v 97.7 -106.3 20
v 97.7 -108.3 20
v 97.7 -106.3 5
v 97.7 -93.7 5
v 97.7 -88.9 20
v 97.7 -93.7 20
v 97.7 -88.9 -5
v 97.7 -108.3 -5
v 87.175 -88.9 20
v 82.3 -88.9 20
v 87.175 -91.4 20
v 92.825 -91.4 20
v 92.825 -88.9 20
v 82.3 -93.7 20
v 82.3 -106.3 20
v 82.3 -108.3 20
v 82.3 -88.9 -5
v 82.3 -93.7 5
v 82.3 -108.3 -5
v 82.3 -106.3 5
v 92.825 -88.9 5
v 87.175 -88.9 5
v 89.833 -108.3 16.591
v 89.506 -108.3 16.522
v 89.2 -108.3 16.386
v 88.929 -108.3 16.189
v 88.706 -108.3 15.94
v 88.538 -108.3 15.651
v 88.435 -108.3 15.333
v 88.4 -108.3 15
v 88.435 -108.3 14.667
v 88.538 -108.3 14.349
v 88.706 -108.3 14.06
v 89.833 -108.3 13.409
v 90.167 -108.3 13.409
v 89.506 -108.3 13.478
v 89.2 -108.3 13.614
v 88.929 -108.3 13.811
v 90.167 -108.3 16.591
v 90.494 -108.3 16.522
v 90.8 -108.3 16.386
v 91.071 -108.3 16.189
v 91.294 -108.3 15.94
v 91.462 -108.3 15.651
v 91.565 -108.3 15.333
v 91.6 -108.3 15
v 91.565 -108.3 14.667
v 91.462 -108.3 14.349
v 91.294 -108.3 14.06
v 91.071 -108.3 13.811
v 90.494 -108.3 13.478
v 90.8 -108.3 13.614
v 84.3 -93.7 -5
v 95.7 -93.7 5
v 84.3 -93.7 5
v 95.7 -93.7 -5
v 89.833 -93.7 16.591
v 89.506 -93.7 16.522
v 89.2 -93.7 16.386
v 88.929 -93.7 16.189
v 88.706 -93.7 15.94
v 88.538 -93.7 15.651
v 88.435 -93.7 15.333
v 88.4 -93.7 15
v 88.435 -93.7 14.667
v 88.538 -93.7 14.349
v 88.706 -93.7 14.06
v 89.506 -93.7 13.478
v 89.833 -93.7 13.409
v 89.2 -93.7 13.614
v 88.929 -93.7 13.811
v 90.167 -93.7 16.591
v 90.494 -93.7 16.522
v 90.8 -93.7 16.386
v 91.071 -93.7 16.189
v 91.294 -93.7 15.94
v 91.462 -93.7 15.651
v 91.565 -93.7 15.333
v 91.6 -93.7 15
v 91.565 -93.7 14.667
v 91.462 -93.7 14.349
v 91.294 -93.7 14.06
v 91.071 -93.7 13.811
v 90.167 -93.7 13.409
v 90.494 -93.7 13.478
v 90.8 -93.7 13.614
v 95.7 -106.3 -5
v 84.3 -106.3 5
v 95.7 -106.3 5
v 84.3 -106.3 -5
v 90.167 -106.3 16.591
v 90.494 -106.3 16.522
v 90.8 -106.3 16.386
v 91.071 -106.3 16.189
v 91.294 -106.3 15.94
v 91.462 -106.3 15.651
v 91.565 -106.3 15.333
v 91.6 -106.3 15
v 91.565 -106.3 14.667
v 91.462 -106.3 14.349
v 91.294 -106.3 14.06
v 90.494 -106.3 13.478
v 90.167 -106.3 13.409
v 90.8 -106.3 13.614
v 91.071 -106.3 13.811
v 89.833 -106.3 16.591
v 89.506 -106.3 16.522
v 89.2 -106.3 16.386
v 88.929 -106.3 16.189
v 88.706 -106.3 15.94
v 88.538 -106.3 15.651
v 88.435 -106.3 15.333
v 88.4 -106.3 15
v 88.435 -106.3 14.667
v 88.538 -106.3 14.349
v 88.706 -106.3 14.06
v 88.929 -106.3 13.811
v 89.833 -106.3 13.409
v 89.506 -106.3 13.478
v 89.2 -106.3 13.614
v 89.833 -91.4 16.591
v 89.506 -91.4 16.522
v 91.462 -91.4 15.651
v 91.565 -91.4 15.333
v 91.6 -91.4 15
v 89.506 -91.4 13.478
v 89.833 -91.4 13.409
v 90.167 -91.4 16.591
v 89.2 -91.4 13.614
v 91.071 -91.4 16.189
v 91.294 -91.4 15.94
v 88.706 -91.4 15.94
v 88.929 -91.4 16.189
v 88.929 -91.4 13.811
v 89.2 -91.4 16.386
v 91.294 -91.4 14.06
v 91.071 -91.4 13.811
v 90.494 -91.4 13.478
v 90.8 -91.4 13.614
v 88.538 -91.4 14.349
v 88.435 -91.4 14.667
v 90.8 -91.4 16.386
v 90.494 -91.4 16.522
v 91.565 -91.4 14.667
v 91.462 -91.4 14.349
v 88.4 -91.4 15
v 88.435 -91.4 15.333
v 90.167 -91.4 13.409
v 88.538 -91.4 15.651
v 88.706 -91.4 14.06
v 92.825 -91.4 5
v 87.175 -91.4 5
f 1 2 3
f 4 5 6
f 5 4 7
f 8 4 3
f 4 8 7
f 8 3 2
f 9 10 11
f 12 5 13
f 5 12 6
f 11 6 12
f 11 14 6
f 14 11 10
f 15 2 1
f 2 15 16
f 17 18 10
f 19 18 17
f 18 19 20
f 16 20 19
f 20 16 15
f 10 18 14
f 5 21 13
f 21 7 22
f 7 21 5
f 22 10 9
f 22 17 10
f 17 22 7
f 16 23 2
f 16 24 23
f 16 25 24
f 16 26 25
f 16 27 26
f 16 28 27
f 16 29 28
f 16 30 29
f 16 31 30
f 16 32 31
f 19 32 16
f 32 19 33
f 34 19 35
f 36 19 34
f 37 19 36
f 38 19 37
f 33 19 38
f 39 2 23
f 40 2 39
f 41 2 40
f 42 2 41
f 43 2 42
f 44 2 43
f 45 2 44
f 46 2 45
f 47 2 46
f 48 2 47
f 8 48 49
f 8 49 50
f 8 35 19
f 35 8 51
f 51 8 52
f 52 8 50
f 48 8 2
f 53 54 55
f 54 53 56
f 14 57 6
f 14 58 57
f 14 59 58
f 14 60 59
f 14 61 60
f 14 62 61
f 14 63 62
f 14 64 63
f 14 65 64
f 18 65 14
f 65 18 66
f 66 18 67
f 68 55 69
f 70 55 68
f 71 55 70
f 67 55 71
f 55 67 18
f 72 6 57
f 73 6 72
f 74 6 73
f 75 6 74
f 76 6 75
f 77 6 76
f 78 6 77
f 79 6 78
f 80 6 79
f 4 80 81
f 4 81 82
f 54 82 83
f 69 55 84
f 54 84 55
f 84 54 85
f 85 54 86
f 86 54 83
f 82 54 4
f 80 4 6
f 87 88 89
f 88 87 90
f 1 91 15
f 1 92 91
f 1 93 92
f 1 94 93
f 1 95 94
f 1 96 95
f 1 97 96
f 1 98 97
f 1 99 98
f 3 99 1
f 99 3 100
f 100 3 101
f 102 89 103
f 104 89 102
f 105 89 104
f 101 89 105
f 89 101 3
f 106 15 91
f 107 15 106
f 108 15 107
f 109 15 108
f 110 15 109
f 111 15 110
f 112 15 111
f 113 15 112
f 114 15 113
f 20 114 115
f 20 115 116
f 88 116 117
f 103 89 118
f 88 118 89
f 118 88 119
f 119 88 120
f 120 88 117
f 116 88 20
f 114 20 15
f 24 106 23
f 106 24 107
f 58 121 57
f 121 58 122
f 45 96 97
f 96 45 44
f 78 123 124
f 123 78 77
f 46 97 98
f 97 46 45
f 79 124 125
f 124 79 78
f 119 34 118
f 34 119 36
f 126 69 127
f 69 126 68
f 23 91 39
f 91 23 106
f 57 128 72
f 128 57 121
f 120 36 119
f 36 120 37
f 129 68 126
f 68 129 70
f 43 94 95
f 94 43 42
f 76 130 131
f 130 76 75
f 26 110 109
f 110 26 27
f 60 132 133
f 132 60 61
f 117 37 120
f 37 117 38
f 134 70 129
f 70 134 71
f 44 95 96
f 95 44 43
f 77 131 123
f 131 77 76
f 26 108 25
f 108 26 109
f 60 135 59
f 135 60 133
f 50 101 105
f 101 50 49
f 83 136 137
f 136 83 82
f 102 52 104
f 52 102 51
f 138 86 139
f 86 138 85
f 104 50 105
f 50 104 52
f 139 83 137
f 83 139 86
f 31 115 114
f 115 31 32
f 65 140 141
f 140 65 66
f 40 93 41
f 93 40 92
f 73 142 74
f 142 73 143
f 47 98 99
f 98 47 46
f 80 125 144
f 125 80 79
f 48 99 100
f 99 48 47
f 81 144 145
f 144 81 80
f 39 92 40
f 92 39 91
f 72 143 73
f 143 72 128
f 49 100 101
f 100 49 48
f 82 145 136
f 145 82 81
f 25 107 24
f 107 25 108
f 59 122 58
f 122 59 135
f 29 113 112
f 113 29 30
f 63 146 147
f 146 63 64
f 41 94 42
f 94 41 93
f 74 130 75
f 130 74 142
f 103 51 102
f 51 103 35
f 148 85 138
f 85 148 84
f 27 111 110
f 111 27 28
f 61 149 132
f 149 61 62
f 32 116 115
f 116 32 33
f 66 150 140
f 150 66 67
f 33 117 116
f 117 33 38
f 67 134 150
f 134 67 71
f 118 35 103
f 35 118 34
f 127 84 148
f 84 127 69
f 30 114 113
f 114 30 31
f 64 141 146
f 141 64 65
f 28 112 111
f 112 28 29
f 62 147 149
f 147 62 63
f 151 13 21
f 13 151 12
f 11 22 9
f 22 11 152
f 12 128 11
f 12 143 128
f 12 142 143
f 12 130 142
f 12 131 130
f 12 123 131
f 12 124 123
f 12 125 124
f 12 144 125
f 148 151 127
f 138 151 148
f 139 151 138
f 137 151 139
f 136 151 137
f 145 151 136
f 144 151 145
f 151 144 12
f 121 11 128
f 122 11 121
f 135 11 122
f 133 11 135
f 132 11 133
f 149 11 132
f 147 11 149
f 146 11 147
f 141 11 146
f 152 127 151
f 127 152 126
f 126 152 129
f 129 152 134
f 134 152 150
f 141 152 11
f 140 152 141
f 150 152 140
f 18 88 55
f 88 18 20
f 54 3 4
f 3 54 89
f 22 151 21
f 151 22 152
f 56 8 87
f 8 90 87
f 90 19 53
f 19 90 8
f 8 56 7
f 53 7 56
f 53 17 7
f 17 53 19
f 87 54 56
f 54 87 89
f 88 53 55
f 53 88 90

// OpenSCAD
use <bed_carriage.scad>

height = 12;
translate([90, -100]) boltholder_center();
